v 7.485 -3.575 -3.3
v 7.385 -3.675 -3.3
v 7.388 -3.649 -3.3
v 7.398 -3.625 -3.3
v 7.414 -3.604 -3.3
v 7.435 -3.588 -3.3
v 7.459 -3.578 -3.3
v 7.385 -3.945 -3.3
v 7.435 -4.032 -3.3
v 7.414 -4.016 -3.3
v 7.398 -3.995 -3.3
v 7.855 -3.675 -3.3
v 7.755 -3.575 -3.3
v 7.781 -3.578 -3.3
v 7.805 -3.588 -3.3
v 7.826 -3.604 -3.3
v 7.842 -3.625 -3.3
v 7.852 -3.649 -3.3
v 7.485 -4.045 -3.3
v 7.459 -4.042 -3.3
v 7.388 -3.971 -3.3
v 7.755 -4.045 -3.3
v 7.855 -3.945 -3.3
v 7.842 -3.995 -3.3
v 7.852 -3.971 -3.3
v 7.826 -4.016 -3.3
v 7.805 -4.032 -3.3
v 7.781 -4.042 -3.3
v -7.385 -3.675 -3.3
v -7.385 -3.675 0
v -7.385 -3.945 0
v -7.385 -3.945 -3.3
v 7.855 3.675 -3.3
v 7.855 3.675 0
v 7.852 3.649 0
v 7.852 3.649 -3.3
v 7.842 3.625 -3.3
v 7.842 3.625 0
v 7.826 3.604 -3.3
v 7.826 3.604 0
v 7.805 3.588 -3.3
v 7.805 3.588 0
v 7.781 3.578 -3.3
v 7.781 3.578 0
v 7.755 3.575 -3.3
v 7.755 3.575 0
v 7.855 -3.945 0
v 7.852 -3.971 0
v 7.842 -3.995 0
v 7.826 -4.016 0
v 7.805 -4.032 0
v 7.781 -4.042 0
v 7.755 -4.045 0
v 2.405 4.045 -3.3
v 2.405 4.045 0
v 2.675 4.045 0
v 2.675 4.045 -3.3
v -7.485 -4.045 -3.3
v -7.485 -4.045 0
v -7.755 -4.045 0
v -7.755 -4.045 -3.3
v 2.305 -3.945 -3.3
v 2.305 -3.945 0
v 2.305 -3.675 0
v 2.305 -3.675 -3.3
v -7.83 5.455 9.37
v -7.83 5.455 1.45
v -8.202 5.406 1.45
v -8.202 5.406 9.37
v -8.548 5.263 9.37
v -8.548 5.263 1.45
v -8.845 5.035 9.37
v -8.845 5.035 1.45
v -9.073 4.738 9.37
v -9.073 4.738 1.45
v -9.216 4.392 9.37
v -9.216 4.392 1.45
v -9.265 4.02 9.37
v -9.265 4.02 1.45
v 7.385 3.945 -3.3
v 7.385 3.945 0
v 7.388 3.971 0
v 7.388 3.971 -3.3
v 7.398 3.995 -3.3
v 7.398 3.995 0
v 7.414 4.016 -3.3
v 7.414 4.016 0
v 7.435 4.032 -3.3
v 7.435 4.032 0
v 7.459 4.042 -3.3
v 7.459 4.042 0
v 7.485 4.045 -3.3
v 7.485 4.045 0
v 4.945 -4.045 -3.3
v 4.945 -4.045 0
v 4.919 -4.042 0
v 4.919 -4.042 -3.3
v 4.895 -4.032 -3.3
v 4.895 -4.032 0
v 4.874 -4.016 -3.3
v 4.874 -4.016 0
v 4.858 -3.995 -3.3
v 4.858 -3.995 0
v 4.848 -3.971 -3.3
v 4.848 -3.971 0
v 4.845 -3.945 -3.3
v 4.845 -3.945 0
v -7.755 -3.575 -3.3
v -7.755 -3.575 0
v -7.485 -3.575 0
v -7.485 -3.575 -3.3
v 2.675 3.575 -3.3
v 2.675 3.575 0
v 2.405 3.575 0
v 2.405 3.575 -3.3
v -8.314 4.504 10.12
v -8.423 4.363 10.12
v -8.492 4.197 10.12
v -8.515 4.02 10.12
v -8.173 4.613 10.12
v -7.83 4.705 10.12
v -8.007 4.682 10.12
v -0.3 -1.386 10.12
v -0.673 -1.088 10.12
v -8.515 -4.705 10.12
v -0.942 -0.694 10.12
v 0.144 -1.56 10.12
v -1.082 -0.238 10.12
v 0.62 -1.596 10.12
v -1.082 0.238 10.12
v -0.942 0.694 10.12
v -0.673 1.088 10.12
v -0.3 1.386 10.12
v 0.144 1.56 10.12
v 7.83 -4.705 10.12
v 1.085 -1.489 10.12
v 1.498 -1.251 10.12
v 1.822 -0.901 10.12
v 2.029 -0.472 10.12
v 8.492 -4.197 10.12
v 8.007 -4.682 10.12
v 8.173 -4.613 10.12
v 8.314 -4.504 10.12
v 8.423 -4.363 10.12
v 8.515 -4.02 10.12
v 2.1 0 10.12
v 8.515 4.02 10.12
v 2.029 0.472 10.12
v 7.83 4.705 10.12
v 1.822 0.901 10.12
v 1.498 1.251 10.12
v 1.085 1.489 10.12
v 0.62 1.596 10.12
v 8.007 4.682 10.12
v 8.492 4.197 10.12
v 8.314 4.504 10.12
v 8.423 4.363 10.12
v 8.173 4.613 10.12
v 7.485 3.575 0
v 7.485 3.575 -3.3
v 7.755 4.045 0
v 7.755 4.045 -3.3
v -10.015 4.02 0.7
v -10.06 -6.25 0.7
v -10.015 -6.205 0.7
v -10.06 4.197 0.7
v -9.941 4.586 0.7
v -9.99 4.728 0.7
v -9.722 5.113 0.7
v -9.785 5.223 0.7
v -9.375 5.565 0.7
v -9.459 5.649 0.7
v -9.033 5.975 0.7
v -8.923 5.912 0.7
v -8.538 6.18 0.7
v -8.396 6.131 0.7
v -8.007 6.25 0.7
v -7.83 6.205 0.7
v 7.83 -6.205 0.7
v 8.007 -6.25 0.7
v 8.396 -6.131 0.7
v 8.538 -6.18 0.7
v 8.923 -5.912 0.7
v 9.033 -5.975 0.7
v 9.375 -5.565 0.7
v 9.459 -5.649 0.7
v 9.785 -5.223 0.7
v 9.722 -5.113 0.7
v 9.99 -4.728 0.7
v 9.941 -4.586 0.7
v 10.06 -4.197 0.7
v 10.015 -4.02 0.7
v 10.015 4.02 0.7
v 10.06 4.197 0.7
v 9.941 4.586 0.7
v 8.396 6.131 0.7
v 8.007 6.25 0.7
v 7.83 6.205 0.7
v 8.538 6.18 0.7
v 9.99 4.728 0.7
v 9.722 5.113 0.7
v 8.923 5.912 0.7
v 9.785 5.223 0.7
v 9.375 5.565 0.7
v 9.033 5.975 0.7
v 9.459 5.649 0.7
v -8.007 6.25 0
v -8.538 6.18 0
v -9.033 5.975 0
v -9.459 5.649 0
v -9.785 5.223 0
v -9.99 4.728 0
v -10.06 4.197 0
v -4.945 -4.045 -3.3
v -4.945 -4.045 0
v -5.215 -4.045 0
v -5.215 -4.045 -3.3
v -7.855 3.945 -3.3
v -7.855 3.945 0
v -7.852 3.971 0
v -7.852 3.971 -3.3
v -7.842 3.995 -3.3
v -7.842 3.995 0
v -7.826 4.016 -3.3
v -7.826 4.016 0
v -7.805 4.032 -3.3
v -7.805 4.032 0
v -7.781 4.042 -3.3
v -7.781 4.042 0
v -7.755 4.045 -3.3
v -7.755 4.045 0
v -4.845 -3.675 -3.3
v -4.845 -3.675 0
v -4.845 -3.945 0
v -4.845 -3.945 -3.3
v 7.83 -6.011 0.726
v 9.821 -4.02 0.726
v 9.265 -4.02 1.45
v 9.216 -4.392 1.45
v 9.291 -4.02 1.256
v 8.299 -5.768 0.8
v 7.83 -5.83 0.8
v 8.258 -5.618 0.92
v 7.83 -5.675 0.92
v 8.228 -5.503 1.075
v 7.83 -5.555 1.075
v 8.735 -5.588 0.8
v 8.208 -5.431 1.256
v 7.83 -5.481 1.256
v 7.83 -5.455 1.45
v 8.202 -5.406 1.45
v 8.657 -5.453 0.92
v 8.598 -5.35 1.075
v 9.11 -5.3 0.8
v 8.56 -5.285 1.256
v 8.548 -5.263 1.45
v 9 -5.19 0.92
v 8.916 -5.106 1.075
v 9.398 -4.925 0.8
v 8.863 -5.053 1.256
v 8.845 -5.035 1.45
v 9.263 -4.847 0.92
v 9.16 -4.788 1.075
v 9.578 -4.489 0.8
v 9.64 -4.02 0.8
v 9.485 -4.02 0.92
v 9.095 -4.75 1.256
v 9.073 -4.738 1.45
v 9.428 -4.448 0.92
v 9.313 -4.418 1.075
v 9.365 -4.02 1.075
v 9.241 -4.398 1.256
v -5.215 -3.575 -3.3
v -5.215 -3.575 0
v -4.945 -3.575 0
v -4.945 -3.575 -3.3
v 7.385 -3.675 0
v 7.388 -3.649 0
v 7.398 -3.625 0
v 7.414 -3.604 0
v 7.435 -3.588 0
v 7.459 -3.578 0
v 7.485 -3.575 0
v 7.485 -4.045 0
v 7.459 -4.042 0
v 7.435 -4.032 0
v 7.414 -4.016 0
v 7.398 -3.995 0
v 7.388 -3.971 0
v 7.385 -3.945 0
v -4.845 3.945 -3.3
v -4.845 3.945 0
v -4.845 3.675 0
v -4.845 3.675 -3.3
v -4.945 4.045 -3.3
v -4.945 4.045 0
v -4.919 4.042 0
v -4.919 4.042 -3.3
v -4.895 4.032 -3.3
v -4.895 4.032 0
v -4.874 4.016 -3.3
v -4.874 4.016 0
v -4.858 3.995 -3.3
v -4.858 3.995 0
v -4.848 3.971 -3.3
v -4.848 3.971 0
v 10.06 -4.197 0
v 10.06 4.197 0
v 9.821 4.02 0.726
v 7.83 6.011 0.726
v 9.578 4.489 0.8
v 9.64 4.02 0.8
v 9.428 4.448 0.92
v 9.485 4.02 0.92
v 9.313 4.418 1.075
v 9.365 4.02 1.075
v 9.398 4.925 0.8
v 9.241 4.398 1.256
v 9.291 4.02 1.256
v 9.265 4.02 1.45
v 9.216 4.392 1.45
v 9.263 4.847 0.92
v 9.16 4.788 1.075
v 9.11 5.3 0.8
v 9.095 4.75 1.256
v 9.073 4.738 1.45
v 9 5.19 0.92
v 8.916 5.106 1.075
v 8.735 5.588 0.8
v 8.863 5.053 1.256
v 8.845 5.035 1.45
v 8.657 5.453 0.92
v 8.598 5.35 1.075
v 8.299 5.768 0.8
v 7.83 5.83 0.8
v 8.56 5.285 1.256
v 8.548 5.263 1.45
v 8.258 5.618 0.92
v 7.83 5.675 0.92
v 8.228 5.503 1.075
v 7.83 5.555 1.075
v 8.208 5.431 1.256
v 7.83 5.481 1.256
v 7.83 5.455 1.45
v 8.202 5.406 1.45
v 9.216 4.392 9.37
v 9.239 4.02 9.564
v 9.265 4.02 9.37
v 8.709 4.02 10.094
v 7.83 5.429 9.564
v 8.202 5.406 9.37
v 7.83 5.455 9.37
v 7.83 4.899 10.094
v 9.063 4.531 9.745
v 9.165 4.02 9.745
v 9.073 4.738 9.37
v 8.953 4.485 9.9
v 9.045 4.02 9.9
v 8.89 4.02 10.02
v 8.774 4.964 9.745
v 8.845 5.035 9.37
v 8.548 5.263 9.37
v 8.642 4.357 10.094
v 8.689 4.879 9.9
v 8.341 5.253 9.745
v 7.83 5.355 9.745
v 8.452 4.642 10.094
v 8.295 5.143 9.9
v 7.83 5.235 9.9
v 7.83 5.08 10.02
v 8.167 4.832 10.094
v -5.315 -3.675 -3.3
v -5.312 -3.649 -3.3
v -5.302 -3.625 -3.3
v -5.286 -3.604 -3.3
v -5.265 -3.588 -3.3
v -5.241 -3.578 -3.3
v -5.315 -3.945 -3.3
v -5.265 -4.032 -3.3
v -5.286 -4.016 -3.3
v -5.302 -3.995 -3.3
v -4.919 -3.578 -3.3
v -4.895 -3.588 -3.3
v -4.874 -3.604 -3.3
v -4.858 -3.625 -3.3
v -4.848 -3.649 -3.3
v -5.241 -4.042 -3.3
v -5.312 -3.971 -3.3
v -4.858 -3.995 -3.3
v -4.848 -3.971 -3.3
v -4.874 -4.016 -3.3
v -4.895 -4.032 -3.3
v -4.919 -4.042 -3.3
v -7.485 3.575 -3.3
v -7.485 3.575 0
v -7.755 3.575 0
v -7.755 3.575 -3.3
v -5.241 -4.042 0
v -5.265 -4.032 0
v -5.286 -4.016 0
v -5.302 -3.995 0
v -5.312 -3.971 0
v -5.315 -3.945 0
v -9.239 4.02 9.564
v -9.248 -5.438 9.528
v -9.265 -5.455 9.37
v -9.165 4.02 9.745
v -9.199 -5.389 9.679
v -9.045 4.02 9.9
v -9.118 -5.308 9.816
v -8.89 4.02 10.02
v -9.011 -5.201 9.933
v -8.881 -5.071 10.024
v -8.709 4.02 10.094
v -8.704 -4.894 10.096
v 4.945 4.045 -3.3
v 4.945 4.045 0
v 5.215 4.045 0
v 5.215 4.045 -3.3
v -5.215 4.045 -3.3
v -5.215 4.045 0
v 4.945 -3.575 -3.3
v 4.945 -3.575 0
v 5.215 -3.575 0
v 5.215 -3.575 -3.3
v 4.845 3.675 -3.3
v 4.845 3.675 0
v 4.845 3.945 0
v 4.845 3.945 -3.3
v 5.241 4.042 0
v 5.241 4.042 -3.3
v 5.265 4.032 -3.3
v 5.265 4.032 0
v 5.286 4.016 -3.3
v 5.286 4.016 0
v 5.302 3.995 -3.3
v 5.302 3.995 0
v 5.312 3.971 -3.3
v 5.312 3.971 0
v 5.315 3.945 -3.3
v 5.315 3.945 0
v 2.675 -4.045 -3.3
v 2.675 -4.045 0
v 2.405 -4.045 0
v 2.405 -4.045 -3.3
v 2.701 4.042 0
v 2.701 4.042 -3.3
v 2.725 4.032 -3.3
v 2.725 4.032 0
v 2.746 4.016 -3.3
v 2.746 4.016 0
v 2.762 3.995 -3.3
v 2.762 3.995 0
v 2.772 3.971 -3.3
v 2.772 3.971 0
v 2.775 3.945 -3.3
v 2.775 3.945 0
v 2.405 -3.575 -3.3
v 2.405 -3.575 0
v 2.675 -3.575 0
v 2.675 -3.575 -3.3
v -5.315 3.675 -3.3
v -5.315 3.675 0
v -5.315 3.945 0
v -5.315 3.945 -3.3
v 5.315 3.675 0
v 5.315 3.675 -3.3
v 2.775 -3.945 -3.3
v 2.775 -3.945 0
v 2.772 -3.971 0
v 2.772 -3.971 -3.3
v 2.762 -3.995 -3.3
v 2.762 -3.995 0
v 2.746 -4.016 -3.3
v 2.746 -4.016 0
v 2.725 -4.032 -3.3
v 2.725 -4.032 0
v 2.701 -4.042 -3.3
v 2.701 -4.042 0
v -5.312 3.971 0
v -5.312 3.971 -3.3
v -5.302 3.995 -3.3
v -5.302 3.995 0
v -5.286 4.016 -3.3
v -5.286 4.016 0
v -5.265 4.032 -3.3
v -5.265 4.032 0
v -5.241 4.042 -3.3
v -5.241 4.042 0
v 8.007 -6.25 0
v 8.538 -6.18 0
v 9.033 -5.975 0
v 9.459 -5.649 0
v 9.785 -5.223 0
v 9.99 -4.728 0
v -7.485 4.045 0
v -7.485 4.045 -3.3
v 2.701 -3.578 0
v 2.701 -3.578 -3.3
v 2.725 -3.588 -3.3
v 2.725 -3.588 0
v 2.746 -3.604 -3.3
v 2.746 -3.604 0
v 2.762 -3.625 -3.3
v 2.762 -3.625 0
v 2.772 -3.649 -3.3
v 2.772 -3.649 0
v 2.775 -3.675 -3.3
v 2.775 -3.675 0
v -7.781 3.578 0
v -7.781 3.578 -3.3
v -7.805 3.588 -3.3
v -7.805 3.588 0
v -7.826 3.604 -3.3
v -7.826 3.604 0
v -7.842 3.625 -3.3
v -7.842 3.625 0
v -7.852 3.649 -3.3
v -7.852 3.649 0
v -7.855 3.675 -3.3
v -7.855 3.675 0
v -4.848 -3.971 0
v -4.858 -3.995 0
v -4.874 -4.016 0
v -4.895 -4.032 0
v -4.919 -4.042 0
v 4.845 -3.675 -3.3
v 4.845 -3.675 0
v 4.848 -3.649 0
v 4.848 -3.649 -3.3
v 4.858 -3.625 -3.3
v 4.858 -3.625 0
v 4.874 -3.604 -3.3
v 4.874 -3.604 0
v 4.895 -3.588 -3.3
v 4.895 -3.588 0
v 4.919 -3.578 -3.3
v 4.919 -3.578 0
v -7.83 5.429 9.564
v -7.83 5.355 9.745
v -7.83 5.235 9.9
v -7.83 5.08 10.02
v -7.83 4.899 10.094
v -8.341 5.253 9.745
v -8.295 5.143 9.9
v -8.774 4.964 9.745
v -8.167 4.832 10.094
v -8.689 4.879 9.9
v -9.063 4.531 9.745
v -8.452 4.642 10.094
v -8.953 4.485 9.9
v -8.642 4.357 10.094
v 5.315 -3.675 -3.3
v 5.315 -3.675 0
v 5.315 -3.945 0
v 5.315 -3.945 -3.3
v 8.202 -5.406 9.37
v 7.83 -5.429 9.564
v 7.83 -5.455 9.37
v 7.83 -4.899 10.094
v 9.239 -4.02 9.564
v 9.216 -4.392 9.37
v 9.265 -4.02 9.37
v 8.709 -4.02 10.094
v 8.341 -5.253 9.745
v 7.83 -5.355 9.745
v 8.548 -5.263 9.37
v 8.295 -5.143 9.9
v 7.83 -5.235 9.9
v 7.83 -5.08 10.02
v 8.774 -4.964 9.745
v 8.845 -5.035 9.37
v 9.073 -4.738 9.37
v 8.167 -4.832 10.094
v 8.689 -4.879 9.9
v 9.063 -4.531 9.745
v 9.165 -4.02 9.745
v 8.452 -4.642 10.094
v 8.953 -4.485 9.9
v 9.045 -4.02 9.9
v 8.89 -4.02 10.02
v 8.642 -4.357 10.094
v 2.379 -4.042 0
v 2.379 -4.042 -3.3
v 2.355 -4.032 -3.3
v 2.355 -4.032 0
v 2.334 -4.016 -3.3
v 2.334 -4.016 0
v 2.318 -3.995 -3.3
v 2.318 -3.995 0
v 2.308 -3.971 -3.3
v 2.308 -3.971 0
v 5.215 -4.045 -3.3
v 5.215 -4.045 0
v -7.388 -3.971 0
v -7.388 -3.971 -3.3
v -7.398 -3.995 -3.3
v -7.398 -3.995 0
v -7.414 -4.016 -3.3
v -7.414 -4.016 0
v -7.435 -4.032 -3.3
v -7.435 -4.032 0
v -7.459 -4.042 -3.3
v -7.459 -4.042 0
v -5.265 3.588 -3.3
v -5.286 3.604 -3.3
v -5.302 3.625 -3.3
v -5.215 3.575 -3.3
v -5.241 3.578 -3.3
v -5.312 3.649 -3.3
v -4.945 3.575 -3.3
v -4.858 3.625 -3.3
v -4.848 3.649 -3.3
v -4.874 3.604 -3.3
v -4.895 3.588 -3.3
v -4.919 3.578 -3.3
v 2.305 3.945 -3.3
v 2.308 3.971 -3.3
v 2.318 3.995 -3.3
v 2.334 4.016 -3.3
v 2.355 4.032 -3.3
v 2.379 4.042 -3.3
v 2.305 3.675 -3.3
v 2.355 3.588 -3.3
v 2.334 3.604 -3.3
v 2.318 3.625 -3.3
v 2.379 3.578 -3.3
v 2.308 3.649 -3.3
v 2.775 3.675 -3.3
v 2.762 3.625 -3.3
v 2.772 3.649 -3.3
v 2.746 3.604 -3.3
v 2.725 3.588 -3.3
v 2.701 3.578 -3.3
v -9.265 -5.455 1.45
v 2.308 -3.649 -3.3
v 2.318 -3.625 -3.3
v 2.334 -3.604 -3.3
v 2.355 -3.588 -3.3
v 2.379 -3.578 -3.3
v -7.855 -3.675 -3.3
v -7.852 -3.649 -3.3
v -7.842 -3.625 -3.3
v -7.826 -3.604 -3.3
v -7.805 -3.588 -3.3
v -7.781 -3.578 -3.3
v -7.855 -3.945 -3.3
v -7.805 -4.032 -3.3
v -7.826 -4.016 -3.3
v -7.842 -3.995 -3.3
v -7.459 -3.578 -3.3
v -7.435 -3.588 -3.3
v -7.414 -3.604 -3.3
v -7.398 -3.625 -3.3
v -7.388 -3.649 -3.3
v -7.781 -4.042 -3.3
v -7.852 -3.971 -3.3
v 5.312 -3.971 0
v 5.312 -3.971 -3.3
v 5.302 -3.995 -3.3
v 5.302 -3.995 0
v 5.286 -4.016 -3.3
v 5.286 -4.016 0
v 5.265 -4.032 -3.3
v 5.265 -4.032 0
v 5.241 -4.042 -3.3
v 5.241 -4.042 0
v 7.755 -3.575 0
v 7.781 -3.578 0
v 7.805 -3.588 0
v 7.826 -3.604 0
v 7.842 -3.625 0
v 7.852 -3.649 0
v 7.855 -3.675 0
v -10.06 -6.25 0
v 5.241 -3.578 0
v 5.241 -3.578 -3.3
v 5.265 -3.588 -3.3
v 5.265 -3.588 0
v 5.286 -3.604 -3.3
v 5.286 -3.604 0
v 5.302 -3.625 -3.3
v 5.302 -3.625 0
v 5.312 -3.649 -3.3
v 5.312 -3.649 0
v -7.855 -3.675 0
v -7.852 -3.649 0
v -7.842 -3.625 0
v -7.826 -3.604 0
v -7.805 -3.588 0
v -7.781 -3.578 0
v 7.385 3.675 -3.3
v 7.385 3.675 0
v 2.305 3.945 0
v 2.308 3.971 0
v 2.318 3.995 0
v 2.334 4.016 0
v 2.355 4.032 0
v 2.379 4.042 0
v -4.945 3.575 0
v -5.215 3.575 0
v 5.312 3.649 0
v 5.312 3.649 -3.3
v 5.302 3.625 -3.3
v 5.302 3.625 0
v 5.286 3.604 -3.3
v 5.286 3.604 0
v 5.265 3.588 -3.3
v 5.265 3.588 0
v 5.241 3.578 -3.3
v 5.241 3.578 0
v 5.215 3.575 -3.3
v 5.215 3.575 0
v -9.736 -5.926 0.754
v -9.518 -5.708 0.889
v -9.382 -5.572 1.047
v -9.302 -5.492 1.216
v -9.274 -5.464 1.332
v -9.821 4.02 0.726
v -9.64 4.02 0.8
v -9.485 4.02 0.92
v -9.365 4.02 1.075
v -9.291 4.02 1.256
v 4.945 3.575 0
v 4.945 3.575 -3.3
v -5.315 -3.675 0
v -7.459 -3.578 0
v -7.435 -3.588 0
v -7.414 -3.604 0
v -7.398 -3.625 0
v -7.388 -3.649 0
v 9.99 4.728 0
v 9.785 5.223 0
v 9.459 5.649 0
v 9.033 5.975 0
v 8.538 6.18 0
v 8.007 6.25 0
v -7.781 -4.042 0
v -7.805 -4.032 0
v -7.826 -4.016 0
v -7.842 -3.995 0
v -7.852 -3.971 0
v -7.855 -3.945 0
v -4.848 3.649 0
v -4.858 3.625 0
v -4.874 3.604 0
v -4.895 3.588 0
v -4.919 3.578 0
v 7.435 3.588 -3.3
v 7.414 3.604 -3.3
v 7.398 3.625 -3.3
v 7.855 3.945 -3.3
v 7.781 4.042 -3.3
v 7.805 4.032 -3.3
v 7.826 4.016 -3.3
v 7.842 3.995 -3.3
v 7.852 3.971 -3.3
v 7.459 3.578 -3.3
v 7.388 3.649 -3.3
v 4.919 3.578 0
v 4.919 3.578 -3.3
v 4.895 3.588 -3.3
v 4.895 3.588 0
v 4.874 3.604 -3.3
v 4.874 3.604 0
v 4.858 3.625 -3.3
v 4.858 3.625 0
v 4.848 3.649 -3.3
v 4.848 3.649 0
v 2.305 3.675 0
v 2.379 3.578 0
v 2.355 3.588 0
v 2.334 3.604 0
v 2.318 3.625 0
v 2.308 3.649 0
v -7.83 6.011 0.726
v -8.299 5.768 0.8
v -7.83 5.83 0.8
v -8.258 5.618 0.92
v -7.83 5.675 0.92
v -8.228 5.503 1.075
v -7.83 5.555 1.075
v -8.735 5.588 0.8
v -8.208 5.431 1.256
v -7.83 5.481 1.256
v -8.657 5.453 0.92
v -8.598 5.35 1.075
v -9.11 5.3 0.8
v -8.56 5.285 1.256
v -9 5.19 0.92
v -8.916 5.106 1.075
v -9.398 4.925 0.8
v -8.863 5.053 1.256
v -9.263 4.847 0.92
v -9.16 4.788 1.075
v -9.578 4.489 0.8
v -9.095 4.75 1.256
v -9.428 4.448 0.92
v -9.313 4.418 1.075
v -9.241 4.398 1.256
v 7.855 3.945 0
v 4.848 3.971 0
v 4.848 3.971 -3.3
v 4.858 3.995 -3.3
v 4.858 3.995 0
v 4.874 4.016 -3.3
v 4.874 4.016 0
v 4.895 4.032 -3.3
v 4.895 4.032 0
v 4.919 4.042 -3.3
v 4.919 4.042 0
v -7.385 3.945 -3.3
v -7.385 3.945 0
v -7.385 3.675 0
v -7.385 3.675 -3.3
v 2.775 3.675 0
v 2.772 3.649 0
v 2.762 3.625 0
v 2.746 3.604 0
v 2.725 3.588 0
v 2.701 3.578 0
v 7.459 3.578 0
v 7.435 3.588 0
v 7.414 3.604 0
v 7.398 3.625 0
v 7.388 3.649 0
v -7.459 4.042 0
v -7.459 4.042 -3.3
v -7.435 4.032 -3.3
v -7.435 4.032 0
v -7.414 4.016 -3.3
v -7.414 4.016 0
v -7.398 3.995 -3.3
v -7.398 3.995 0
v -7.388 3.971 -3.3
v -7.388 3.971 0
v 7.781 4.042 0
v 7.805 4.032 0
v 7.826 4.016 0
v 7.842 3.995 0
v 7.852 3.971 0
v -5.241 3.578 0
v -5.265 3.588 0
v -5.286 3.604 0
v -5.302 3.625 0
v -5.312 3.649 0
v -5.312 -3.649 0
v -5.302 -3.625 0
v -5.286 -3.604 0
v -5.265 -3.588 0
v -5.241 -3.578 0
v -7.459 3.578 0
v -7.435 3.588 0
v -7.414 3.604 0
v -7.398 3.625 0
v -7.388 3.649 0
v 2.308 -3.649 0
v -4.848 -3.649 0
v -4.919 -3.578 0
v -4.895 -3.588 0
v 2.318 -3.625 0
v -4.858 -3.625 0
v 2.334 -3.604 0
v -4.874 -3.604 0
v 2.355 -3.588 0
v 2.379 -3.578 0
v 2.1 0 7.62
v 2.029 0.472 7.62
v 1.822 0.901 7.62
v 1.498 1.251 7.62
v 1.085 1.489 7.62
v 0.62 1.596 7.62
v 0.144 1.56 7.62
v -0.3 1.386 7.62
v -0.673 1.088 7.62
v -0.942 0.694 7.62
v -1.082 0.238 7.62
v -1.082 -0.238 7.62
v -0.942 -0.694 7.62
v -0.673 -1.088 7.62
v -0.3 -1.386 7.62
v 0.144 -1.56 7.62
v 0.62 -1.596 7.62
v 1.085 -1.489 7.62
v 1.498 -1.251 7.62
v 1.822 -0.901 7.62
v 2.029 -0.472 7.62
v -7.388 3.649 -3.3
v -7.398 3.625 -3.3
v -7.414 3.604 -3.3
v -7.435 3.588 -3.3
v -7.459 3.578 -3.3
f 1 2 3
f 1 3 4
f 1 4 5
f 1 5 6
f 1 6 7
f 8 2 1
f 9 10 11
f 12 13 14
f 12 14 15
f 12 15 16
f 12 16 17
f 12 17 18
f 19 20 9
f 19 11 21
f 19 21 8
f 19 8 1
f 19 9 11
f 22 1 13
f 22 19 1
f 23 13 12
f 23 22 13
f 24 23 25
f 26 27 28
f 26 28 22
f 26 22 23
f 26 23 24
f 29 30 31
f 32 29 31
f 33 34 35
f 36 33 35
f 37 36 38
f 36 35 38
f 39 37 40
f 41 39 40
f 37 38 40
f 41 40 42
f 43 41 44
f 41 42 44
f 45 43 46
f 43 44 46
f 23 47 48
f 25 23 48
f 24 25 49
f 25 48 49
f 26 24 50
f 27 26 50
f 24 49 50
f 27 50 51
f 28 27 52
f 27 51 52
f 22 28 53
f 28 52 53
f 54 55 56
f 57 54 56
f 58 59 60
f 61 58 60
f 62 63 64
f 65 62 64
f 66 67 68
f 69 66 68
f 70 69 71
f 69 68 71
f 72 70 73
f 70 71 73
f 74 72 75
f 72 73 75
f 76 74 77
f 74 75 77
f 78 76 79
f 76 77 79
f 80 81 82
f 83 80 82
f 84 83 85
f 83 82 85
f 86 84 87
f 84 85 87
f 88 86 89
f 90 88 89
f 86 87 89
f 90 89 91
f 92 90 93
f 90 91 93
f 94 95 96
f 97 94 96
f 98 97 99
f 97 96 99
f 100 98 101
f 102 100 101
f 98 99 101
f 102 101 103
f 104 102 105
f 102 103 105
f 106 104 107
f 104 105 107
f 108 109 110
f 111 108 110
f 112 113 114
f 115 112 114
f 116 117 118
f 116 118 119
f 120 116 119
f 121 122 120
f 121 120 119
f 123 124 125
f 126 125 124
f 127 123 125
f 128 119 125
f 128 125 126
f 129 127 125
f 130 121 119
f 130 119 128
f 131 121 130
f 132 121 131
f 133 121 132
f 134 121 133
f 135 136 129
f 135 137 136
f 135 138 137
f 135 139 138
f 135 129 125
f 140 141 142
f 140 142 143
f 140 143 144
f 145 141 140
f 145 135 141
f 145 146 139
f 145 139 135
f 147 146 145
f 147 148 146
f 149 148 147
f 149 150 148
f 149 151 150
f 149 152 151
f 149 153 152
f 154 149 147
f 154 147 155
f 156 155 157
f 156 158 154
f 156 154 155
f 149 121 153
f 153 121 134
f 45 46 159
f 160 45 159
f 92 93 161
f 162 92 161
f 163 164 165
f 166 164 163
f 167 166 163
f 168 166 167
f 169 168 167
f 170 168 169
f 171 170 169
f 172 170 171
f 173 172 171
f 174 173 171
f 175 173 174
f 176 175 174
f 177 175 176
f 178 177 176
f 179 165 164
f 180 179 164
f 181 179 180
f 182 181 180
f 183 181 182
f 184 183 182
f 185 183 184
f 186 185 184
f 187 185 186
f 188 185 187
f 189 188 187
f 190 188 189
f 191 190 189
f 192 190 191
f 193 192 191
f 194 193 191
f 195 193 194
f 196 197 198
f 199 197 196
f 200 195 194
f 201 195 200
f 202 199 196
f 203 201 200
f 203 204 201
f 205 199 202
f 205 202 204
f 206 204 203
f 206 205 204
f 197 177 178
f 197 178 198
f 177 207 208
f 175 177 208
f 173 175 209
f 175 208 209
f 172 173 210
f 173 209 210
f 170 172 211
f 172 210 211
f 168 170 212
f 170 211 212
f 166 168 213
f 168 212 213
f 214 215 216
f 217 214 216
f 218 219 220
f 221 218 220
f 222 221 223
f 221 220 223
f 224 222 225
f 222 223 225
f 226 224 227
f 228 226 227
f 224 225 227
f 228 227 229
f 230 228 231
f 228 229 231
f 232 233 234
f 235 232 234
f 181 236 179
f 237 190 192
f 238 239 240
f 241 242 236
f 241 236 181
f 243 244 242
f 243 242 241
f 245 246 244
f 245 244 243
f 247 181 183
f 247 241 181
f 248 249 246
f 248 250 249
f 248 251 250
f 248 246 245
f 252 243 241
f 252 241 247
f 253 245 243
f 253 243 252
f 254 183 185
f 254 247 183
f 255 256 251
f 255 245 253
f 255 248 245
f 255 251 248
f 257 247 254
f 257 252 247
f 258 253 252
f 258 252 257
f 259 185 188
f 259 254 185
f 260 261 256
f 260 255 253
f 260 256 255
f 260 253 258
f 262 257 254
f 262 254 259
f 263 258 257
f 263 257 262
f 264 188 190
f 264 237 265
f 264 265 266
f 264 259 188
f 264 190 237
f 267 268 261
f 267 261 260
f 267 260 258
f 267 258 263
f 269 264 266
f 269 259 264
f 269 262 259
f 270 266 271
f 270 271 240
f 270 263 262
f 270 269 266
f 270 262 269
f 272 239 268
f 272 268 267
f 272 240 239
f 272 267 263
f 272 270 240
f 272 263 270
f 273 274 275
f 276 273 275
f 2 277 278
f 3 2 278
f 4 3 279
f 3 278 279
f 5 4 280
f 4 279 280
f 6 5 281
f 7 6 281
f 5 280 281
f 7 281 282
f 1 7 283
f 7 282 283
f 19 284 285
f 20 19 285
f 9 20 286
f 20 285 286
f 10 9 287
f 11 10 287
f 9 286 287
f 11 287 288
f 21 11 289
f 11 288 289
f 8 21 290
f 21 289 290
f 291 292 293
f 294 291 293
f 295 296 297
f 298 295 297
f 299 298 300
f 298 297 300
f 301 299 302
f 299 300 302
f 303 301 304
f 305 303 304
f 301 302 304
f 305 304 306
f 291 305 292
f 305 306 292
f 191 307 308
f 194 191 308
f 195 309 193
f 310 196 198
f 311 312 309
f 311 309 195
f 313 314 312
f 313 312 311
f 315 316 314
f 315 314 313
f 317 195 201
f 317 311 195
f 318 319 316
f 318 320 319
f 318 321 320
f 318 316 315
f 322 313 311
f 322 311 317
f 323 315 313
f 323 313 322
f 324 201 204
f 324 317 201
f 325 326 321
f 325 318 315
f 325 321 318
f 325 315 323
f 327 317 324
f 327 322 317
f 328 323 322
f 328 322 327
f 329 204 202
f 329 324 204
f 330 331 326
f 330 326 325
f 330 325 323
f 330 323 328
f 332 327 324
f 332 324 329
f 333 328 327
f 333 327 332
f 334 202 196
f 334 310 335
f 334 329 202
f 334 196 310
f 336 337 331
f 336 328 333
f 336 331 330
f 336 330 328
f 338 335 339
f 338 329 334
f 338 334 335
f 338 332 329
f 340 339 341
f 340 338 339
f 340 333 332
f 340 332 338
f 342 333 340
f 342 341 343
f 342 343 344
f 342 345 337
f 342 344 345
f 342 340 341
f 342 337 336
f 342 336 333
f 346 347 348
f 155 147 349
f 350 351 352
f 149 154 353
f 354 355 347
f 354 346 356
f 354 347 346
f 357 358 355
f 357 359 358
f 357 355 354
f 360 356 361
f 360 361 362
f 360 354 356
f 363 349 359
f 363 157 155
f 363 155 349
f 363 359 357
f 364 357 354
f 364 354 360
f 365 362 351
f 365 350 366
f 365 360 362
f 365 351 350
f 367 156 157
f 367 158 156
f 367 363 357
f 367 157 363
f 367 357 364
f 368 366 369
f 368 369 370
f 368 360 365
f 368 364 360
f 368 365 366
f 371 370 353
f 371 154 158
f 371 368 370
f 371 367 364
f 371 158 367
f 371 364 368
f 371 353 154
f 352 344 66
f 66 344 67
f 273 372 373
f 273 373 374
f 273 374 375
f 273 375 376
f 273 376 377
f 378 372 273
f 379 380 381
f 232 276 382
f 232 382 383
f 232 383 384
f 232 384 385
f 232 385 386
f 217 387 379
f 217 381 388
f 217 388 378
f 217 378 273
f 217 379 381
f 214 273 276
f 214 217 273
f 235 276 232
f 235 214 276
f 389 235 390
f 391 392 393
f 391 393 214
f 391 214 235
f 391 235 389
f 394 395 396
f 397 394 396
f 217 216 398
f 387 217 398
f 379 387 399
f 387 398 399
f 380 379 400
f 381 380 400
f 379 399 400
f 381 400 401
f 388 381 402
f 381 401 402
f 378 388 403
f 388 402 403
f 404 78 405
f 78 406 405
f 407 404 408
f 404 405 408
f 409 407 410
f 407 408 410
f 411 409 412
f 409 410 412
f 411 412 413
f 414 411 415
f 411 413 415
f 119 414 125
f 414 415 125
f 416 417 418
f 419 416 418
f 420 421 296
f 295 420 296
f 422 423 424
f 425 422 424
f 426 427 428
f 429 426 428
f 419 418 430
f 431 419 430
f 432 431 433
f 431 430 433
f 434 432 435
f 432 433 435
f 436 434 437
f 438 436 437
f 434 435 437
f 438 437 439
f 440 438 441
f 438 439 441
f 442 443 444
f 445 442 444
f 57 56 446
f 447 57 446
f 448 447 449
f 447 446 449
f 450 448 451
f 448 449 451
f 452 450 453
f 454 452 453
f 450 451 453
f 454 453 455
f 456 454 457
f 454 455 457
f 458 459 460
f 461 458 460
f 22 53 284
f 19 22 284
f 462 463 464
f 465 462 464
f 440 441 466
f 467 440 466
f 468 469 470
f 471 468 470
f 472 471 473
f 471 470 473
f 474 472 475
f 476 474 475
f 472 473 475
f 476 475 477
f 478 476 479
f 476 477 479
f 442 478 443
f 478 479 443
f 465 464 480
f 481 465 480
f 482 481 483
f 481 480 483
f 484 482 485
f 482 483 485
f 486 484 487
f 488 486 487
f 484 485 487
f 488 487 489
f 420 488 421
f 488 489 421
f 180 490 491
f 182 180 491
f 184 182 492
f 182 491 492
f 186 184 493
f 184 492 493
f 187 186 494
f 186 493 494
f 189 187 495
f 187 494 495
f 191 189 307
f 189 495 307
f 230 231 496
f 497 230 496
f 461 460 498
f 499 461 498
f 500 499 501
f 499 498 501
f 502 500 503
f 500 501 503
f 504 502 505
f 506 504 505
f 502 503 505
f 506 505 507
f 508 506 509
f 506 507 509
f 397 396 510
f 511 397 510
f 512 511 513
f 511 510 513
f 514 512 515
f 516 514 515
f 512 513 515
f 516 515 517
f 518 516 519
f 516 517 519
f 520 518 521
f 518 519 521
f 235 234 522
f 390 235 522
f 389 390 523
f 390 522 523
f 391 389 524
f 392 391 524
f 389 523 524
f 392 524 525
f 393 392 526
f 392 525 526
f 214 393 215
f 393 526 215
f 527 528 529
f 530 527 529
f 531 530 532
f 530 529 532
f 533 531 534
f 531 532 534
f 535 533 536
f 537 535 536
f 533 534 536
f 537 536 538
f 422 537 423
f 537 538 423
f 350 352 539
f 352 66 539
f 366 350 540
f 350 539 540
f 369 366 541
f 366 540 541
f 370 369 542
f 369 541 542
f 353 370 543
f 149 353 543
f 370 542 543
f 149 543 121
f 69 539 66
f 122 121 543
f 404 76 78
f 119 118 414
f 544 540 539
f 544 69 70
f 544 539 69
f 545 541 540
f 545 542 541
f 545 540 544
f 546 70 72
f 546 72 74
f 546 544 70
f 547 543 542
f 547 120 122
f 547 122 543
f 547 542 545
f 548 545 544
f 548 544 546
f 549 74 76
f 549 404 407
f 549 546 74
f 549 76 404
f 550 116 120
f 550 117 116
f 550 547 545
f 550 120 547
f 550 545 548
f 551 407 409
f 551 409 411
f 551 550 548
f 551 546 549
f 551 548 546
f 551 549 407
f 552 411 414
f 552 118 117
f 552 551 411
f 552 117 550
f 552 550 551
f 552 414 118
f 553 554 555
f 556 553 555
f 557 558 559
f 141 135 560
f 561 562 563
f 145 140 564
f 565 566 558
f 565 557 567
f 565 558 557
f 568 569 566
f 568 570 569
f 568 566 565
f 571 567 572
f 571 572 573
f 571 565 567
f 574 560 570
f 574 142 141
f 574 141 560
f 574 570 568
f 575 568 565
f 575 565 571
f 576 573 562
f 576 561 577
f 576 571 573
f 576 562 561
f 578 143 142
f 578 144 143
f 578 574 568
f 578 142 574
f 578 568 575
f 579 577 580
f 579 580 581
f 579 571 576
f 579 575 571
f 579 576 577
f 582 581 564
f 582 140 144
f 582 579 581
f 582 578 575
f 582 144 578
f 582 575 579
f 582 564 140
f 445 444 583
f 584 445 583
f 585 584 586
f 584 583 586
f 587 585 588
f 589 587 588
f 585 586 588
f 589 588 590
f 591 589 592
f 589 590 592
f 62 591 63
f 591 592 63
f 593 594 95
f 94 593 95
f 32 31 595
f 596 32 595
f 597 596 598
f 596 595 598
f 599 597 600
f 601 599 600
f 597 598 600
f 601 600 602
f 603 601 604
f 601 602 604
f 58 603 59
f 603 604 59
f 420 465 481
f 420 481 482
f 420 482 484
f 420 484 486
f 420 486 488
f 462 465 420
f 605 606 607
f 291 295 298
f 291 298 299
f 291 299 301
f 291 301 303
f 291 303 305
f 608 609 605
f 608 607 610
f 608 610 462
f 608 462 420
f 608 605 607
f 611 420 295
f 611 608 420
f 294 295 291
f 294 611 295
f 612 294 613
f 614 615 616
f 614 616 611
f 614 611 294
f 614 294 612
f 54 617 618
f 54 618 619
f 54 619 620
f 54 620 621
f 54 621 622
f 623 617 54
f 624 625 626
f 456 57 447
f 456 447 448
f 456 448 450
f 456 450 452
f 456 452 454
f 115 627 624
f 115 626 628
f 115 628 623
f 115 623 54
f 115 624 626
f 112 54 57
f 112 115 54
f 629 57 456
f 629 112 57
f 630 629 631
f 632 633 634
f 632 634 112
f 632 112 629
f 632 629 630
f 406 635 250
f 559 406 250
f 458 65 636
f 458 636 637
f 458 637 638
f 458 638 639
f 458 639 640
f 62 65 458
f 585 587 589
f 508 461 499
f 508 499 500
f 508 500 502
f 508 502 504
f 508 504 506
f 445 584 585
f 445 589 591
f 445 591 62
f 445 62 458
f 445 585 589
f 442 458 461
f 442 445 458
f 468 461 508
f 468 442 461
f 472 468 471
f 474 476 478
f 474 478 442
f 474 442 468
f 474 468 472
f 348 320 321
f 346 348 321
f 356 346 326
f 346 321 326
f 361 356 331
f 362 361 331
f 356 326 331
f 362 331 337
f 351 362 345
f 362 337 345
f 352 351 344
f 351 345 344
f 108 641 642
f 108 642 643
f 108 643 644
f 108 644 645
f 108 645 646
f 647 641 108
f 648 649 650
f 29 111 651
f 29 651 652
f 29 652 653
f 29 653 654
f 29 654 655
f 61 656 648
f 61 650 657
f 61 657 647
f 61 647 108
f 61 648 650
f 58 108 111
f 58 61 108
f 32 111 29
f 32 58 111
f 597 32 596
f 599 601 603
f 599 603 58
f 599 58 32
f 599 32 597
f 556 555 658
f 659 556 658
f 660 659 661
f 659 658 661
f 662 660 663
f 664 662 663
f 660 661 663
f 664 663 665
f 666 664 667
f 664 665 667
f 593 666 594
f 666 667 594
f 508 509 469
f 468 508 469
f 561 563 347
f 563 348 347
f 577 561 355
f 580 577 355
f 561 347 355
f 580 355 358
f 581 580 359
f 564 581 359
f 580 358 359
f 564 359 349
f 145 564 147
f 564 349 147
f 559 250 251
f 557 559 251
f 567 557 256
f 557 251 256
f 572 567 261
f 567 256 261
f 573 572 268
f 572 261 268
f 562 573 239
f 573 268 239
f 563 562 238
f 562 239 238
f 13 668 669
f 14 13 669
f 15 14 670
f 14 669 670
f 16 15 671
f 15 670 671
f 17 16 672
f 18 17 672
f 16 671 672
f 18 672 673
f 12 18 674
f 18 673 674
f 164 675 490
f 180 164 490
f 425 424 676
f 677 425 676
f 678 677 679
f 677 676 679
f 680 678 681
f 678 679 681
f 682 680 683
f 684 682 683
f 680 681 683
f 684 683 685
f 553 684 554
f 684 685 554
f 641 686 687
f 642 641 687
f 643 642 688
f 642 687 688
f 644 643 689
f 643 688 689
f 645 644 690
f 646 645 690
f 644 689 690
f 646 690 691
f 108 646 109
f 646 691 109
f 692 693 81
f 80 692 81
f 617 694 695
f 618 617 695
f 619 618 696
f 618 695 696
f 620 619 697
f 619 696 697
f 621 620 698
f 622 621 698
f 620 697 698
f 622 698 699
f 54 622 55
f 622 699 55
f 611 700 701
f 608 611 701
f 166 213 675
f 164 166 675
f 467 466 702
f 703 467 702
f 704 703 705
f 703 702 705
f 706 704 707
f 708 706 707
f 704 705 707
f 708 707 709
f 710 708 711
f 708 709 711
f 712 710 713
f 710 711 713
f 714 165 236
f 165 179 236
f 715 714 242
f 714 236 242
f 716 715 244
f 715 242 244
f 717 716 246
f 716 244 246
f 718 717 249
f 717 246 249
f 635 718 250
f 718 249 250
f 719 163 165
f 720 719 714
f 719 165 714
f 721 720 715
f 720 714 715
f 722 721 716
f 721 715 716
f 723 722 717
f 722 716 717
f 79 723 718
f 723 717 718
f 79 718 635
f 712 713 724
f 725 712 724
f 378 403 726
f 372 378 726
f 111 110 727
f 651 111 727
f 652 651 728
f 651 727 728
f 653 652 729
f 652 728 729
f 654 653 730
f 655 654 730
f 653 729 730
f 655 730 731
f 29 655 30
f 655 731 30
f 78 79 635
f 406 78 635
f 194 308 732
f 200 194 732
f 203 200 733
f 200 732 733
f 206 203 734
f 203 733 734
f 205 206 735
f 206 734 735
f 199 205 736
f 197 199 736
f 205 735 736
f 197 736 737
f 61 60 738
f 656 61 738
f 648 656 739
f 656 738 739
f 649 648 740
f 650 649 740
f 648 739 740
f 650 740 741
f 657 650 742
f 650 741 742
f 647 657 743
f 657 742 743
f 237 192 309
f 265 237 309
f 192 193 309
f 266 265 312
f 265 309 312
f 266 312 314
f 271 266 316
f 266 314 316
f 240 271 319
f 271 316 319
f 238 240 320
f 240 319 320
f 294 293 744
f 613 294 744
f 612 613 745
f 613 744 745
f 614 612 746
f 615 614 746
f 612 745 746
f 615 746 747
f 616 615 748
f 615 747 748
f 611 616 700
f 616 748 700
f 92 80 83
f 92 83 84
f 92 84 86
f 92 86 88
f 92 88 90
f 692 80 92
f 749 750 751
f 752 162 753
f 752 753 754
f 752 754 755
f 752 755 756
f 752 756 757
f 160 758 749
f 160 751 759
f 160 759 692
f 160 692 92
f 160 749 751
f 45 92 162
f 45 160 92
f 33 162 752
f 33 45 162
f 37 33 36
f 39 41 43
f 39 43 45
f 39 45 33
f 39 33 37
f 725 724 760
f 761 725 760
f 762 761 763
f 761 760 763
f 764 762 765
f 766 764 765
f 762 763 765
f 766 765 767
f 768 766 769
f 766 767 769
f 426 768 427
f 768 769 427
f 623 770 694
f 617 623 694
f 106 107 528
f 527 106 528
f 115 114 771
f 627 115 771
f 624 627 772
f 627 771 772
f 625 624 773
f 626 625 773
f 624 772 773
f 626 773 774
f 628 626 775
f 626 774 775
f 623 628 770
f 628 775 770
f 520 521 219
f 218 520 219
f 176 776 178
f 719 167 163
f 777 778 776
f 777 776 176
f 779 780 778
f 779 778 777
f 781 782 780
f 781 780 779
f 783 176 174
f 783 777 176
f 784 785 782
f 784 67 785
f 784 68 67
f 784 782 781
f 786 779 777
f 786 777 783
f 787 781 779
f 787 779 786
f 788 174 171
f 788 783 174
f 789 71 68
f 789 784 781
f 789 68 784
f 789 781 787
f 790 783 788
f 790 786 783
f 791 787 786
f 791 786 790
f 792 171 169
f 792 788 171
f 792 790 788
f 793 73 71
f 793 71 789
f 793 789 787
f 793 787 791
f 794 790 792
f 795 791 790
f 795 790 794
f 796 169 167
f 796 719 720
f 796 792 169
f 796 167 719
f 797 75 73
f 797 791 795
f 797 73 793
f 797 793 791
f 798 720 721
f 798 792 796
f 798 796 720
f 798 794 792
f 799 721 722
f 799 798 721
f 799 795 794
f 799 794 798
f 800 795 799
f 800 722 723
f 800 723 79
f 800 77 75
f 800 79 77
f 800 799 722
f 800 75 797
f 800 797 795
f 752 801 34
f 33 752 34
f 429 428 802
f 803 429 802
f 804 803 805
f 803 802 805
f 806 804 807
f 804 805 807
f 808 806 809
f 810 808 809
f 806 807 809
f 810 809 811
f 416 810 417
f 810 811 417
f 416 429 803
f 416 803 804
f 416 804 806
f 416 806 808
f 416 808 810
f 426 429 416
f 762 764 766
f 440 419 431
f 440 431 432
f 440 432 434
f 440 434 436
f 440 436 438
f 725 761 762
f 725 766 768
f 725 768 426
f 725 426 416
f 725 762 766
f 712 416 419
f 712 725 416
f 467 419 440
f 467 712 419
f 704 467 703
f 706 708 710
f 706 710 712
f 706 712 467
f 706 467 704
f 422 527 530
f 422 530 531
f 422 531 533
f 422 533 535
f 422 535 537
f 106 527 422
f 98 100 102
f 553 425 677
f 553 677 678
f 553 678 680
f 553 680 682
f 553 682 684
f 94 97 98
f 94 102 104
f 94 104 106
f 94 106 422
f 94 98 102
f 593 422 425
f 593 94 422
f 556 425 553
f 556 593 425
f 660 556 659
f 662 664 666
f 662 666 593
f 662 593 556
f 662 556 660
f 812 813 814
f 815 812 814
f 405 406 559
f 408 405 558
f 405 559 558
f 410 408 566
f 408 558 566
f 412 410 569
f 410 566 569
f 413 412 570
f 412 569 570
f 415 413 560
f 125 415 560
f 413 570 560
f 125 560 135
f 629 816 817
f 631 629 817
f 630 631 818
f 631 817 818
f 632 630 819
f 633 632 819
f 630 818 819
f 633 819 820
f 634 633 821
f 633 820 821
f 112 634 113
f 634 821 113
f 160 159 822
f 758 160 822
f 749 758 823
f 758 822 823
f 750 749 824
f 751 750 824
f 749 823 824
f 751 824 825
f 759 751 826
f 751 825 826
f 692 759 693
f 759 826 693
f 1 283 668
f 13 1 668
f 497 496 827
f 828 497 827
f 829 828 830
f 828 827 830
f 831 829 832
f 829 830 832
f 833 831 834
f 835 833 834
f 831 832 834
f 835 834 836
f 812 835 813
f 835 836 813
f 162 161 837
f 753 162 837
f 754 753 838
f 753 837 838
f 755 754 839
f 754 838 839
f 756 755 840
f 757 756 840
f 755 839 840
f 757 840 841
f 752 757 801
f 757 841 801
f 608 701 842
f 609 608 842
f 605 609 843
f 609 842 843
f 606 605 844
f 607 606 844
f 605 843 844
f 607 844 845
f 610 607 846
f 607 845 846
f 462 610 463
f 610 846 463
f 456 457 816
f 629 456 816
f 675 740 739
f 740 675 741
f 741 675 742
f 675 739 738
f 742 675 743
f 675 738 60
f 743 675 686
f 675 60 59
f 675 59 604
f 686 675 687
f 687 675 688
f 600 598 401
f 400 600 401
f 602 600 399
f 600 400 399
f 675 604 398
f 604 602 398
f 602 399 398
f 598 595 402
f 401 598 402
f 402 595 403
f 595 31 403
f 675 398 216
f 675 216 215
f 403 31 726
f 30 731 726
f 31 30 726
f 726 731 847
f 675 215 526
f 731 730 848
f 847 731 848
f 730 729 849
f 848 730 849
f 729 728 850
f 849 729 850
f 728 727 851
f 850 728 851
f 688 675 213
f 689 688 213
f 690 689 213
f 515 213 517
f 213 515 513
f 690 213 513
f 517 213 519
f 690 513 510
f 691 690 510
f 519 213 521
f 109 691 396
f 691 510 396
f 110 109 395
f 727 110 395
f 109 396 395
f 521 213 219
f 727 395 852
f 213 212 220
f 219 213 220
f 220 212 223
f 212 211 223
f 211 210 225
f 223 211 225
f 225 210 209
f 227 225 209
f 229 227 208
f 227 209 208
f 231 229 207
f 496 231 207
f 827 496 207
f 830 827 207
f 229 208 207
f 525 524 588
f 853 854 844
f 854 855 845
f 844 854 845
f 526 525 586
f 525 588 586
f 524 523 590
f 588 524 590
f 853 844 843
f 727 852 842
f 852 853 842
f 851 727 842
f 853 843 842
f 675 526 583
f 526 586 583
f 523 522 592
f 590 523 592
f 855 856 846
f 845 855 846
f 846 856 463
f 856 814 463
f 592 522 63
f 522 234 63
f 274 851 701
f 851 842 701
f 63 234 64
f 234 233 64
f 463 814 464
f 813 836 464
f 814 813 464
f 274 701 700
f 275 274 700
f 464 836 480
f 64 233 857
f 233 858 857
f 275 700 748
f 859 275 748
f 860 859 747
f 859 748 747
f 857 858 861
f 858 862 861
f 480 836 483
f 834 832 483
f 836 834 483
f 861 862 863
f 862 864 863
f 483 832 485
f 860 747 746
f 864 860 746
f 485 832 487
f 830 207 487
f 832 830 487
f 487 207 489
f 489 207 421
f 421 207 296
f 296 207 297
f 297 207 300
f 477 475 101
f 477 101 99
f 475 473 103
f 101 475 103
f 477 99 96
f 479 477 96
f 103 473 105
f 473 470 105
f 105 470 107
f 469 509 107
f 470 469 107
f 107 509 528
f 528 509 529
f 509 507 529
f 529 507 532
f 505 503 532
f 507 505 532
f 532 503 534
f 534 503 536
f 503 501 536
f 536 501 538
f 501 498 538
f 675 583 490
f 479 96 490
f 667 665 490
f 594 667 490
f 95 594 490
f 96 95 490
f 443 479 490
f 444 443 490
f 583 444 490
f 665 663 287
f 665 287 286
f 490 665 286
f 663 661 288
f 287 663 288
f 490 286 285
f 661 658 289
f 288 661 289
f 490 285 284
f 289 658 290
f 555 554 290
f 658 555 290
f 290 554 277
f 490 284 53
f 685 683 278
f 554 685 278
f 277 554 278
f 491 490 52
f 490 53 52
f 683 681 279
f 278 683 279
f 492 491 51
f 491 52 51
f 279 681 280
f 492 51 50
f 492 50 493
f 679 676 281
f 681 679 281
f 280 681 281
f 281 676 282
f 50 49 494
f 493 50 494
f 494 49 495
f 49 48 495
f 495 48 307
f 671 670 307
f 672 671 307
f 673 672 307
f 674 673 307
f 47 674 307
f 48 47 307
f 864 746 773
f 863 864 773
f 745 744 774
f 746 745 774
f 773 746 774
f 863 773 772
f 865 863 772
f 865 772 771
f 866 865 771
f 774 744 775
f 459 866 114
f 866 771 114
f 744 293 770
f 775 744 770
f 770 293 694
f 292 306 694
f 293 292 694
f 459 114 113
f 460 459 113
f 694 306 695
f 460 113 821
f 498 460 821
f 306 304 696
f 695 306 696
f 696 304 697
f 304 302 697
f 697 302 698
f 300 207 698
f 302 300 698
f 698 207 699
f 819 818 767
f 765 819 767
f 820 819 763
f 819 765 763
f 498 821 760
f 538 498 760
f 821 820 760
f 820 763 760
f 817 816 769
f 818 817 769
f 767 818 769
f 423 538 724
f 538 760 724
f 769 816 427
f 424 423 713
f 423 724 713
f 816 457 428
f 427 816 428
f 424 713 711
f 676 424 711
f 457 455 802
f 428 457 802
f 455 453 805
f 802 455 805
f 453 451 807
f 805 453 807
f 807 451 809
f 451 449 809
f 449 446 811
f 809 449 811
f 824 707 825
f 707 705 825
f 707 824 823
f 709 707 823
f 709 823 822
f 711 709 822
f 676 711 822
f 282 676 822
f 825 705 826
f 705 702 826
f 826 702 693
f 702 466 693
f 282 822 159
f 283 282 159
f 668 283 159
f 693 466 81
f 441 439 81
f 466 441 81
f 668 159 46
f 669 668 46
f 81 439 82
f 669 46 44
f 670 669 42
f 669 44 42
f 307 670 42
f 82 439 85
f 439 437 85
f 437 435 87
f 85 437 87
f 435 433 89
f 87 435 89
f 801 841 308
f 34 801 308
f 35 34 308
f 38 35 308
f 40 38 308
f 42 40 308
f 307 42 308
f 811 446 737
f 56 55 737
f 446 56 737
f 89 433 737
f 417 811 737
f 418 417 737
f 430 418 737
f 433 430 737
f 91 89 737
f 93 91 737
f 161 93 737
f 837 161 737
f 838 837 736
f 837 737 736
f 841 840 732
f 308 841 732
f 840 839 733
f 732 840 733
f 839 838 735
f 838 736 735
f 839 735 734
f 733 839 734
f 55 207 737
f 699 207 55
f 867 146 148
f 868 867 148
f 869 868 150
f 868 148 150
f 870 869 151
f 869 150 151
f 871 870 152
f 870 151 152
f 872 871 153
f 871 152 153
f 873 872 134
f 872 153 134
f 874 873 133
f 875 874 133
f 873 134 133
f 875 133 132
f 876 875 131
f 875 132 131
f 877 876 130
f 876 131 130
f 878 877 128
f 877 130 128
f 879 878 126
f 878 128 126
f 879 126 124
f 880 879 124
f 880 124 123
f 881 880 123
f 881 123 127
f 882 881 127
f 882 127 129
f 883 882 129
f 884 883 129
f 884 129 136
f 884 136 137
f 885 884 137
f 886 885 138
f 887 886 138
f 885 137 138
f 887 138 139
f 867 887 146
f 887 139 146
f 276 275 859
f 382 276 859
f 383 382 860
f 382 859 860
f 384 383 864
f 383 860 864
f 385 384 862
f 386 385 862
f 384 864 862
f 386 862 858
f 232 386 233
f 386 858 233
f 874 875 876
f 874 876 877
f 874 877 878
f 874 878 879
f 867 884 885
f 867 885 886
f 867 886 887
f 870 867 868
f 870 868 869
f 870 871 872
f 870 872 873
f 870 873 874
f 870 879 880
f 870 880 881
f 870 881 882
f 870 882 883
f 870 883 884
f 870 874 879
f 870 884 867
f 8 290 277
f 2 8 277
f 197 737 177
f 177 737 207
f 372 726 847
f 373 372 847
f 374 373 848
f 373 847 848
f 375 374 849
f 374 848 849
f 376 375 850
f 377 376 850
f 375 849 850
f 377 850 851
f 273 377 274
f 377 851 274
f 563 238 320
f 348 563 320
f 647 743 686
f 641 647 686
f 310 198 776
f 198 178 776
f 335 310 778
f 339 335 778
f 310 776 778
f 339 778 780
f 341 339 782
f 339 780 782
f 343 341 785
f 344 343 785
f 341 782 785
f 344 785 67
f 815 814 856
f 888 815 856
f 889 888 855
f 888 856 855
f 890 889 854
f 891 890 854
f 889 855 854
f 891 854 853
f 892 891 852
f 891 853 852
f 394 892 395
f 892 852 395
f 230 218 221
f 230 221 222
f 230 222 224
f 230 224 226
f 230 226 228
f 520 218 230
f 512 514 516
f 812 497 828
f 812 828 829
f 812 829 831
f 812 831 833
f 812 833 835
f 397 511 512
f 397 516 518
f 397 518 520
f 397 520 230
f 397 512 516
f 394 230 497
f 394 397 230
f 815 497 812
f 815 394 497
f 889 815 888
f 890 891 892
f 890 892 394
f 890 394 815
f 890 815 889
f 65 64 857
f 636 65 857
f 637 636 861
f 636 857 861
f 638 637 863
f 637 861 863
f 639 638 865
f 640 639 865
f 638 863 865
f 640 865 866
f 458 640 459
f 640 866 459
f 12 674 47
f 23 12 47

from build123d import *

# Parameters (mm, degrees)
PAD002_DEPTH = 3.3
PAD_DEPTH    = 0.7
PAD001_DEPTH = 9.42
FILLET_R     = 0.75
SKETCH002_R  = 1.6
POCKET_DEPTH = 2.5


with BuildPart() as body001:
    # Sketch003 (on Face1 of ReferencePocket) → Pad002 (new body)
    with BuildSketch(Plane(origin=(0, 0, 0), x_dir=(1, 0, 0), z_dir=(0, 0, -1))):
        with BuildLine():
            Line((-7.755, 3.575), (-7.485, 3.575))
            ThreePointArc((-7.485, 3.575), (-7.414289, 3.604289), (-7.385, 3.675))
            Line((-7.385, 3.675), (-7.385, 3.945))
            ThreePointArc((-7.385, 3.945), (-7.414289, 4.015711), (-7.485, 4.045))
            Line((-7.485, 4.045), (-7.755, 4.045))
            ThreePointArc((-7.755, 4.045), (-7.825711, 4.015711), (-7.855, 3.945))
            Line((-7.855, 3.945), (-7.855, 3.675))
            ThreePointArc((-7.855, 3.675), (-7.825711, 3.604289), (-7.755, 3.575))
        make_face()
    extrude(amount=PAD002_DEPTH)


with BuildPart() as fusion:
    # Clone base: copy of Body001
    add(body001.part)


with BuildPart() as fusion_1:
    # Clone placement: moved
    add(fusion.part.moved(Location((0, 7.62, 0))))

    # Fusion: union Body001
    add(body001.part)


with BuildPart() as fusion001:
    # Clone001 base: copy of Fusion
    add(fusion_1.part)


with BuildPart() as fusion001_1:
    # Clone001 placement: moved
    add(fusion001.part.moved(Location((2.54, 0, 0))))


with BuildPart() as fusion002:
    # Clone002 base: copy of Fusion
    add(fusion_1.part)


with BuildPart() as fusion002_1:
    # Clone002 placement: moved
    add(fusion002.part.moved(Location((10.16, 0, 0))))


with BuildPart() as fusion003:
    # Clone003 base: copy of Fusion
    add(fusion_1.part)


with BuildPart() as fusion003_1:
    # Clone003 placement: moved
    add(fusion003.part.moved(Location((12.7, 0, 0))))


with BuildPart() as fusion004:
    # Clone004 base: copy of Fusion
    add(fusion_1.part)


with BuildPart() as fusion004_1:
    # Clone004 placement: moved
    add(fusion004.part.moved(Location((15.24, 0, 0))))


with BuildPart() as fusion005:
    # Fusion001 base: copy of Fusion
    add(fusion_1.part)

    # Fusion001: union Fusion001, Fusion002, Fusion003, Fusion004
    add(fusion001_1.part)
    add(fusion002_1.part)
    add(fusion003_1.part)
    add(fusion004_1.part)


with BuildPart() as fusion006:
    # Sketch → Pad (new body)
    with BuildSketch(Plane.XY):
        with BuildLine():
            Line((-10.06, -6.25), (8.006793, -6.25))
            ThreePointArc((8.006793, -6.25), (9.45863, -5.64863), (10.06, -4.196793))
            Line((10.06, -4.196793), (10.06, 4.196793))
            ThreePointArc((10.06, 4.196793), (9.45863, 5.64863), (8.006793, 6.25))
            Line((8.006793, 6.25), (-8.006793, 6.25))
            ThreePointArc((-8.006793, 6.25), (-9.45863, 5.64863), (-10.06, 4.196793))
            Line((-10.06, 4.196793), (-10.06, -6.25))
        make_face()
    extrude(amount=PAD_DEPTH)

    # Sketch001 (on Face9 of Pad) → Pad001 (join)
    with BuildSketch(Plane.XY.offset(0.7)):
        with BuildLine():
            Line((-9.265, -5.455), (7.830229, -5.455))
            ThreePointArc((7.830229, -5.455), (8.844765, -5.034765), (9.265, -4.020229))
            Line((9.265, -4.020229), (9.265, 4.020228))
            ThreePointArc((9.265, 4.020228), (8.844765, 5.034765), (7.830229, 5.455))
            Line((7.830229, 5.455), (-7.830229, 5.455))
            ThreePointArc((-7.830229, 5.455), (-8.844765, 5.034765), (-9.265, 4.020228))
            Line((-9.265, 4.020228), (-9.265, -5.455))
        make_face()
    extrude(amount=PAD001_DEPTH)

    # Fillet
    fillet_edges = [fusion006.edges().sort_by_distance(p)[0] for p in [
        (-0.717386, -5.455, 0.7),
        (8.844765, -5.034765, 0.7),
        (9.265, 0, 0.7),
        (8.844765, 5.034765, 0.7),
        (0, 5.455, 0.7),
        (-8.844765, 5.034765, 0.7),
        (-9.265, -0.717386, 0.7),
        (-9.265, -0.717386, 10.12),
        (-8.844765, 5.034765, 10.12),
        (0, 5.455, 10.12),
        (8.844765, 5.034765, 10.12),
        (9.265, 0, 10.12),
        (8.844765, -5.034765, 10.12),
        (-0.717386, -5.455, 10.12),
    ]]
    fillet(fillet_edges, radius=FILLET_R)

    # Sketch002 (on Face31 of Fillet) → Pocket (cut)
    with BuildSketch(Plane.XY.offset(10.12)):
        with Locations((0.5, 0)):
            Circle(SKETCH002_R)
    extrude(amount=-POCKET_DEPTH, mode=Mode.SUBTRACT)

    # Fusion002: union Fusion005
    add(fusion005.part)


solid = fusion006.part
